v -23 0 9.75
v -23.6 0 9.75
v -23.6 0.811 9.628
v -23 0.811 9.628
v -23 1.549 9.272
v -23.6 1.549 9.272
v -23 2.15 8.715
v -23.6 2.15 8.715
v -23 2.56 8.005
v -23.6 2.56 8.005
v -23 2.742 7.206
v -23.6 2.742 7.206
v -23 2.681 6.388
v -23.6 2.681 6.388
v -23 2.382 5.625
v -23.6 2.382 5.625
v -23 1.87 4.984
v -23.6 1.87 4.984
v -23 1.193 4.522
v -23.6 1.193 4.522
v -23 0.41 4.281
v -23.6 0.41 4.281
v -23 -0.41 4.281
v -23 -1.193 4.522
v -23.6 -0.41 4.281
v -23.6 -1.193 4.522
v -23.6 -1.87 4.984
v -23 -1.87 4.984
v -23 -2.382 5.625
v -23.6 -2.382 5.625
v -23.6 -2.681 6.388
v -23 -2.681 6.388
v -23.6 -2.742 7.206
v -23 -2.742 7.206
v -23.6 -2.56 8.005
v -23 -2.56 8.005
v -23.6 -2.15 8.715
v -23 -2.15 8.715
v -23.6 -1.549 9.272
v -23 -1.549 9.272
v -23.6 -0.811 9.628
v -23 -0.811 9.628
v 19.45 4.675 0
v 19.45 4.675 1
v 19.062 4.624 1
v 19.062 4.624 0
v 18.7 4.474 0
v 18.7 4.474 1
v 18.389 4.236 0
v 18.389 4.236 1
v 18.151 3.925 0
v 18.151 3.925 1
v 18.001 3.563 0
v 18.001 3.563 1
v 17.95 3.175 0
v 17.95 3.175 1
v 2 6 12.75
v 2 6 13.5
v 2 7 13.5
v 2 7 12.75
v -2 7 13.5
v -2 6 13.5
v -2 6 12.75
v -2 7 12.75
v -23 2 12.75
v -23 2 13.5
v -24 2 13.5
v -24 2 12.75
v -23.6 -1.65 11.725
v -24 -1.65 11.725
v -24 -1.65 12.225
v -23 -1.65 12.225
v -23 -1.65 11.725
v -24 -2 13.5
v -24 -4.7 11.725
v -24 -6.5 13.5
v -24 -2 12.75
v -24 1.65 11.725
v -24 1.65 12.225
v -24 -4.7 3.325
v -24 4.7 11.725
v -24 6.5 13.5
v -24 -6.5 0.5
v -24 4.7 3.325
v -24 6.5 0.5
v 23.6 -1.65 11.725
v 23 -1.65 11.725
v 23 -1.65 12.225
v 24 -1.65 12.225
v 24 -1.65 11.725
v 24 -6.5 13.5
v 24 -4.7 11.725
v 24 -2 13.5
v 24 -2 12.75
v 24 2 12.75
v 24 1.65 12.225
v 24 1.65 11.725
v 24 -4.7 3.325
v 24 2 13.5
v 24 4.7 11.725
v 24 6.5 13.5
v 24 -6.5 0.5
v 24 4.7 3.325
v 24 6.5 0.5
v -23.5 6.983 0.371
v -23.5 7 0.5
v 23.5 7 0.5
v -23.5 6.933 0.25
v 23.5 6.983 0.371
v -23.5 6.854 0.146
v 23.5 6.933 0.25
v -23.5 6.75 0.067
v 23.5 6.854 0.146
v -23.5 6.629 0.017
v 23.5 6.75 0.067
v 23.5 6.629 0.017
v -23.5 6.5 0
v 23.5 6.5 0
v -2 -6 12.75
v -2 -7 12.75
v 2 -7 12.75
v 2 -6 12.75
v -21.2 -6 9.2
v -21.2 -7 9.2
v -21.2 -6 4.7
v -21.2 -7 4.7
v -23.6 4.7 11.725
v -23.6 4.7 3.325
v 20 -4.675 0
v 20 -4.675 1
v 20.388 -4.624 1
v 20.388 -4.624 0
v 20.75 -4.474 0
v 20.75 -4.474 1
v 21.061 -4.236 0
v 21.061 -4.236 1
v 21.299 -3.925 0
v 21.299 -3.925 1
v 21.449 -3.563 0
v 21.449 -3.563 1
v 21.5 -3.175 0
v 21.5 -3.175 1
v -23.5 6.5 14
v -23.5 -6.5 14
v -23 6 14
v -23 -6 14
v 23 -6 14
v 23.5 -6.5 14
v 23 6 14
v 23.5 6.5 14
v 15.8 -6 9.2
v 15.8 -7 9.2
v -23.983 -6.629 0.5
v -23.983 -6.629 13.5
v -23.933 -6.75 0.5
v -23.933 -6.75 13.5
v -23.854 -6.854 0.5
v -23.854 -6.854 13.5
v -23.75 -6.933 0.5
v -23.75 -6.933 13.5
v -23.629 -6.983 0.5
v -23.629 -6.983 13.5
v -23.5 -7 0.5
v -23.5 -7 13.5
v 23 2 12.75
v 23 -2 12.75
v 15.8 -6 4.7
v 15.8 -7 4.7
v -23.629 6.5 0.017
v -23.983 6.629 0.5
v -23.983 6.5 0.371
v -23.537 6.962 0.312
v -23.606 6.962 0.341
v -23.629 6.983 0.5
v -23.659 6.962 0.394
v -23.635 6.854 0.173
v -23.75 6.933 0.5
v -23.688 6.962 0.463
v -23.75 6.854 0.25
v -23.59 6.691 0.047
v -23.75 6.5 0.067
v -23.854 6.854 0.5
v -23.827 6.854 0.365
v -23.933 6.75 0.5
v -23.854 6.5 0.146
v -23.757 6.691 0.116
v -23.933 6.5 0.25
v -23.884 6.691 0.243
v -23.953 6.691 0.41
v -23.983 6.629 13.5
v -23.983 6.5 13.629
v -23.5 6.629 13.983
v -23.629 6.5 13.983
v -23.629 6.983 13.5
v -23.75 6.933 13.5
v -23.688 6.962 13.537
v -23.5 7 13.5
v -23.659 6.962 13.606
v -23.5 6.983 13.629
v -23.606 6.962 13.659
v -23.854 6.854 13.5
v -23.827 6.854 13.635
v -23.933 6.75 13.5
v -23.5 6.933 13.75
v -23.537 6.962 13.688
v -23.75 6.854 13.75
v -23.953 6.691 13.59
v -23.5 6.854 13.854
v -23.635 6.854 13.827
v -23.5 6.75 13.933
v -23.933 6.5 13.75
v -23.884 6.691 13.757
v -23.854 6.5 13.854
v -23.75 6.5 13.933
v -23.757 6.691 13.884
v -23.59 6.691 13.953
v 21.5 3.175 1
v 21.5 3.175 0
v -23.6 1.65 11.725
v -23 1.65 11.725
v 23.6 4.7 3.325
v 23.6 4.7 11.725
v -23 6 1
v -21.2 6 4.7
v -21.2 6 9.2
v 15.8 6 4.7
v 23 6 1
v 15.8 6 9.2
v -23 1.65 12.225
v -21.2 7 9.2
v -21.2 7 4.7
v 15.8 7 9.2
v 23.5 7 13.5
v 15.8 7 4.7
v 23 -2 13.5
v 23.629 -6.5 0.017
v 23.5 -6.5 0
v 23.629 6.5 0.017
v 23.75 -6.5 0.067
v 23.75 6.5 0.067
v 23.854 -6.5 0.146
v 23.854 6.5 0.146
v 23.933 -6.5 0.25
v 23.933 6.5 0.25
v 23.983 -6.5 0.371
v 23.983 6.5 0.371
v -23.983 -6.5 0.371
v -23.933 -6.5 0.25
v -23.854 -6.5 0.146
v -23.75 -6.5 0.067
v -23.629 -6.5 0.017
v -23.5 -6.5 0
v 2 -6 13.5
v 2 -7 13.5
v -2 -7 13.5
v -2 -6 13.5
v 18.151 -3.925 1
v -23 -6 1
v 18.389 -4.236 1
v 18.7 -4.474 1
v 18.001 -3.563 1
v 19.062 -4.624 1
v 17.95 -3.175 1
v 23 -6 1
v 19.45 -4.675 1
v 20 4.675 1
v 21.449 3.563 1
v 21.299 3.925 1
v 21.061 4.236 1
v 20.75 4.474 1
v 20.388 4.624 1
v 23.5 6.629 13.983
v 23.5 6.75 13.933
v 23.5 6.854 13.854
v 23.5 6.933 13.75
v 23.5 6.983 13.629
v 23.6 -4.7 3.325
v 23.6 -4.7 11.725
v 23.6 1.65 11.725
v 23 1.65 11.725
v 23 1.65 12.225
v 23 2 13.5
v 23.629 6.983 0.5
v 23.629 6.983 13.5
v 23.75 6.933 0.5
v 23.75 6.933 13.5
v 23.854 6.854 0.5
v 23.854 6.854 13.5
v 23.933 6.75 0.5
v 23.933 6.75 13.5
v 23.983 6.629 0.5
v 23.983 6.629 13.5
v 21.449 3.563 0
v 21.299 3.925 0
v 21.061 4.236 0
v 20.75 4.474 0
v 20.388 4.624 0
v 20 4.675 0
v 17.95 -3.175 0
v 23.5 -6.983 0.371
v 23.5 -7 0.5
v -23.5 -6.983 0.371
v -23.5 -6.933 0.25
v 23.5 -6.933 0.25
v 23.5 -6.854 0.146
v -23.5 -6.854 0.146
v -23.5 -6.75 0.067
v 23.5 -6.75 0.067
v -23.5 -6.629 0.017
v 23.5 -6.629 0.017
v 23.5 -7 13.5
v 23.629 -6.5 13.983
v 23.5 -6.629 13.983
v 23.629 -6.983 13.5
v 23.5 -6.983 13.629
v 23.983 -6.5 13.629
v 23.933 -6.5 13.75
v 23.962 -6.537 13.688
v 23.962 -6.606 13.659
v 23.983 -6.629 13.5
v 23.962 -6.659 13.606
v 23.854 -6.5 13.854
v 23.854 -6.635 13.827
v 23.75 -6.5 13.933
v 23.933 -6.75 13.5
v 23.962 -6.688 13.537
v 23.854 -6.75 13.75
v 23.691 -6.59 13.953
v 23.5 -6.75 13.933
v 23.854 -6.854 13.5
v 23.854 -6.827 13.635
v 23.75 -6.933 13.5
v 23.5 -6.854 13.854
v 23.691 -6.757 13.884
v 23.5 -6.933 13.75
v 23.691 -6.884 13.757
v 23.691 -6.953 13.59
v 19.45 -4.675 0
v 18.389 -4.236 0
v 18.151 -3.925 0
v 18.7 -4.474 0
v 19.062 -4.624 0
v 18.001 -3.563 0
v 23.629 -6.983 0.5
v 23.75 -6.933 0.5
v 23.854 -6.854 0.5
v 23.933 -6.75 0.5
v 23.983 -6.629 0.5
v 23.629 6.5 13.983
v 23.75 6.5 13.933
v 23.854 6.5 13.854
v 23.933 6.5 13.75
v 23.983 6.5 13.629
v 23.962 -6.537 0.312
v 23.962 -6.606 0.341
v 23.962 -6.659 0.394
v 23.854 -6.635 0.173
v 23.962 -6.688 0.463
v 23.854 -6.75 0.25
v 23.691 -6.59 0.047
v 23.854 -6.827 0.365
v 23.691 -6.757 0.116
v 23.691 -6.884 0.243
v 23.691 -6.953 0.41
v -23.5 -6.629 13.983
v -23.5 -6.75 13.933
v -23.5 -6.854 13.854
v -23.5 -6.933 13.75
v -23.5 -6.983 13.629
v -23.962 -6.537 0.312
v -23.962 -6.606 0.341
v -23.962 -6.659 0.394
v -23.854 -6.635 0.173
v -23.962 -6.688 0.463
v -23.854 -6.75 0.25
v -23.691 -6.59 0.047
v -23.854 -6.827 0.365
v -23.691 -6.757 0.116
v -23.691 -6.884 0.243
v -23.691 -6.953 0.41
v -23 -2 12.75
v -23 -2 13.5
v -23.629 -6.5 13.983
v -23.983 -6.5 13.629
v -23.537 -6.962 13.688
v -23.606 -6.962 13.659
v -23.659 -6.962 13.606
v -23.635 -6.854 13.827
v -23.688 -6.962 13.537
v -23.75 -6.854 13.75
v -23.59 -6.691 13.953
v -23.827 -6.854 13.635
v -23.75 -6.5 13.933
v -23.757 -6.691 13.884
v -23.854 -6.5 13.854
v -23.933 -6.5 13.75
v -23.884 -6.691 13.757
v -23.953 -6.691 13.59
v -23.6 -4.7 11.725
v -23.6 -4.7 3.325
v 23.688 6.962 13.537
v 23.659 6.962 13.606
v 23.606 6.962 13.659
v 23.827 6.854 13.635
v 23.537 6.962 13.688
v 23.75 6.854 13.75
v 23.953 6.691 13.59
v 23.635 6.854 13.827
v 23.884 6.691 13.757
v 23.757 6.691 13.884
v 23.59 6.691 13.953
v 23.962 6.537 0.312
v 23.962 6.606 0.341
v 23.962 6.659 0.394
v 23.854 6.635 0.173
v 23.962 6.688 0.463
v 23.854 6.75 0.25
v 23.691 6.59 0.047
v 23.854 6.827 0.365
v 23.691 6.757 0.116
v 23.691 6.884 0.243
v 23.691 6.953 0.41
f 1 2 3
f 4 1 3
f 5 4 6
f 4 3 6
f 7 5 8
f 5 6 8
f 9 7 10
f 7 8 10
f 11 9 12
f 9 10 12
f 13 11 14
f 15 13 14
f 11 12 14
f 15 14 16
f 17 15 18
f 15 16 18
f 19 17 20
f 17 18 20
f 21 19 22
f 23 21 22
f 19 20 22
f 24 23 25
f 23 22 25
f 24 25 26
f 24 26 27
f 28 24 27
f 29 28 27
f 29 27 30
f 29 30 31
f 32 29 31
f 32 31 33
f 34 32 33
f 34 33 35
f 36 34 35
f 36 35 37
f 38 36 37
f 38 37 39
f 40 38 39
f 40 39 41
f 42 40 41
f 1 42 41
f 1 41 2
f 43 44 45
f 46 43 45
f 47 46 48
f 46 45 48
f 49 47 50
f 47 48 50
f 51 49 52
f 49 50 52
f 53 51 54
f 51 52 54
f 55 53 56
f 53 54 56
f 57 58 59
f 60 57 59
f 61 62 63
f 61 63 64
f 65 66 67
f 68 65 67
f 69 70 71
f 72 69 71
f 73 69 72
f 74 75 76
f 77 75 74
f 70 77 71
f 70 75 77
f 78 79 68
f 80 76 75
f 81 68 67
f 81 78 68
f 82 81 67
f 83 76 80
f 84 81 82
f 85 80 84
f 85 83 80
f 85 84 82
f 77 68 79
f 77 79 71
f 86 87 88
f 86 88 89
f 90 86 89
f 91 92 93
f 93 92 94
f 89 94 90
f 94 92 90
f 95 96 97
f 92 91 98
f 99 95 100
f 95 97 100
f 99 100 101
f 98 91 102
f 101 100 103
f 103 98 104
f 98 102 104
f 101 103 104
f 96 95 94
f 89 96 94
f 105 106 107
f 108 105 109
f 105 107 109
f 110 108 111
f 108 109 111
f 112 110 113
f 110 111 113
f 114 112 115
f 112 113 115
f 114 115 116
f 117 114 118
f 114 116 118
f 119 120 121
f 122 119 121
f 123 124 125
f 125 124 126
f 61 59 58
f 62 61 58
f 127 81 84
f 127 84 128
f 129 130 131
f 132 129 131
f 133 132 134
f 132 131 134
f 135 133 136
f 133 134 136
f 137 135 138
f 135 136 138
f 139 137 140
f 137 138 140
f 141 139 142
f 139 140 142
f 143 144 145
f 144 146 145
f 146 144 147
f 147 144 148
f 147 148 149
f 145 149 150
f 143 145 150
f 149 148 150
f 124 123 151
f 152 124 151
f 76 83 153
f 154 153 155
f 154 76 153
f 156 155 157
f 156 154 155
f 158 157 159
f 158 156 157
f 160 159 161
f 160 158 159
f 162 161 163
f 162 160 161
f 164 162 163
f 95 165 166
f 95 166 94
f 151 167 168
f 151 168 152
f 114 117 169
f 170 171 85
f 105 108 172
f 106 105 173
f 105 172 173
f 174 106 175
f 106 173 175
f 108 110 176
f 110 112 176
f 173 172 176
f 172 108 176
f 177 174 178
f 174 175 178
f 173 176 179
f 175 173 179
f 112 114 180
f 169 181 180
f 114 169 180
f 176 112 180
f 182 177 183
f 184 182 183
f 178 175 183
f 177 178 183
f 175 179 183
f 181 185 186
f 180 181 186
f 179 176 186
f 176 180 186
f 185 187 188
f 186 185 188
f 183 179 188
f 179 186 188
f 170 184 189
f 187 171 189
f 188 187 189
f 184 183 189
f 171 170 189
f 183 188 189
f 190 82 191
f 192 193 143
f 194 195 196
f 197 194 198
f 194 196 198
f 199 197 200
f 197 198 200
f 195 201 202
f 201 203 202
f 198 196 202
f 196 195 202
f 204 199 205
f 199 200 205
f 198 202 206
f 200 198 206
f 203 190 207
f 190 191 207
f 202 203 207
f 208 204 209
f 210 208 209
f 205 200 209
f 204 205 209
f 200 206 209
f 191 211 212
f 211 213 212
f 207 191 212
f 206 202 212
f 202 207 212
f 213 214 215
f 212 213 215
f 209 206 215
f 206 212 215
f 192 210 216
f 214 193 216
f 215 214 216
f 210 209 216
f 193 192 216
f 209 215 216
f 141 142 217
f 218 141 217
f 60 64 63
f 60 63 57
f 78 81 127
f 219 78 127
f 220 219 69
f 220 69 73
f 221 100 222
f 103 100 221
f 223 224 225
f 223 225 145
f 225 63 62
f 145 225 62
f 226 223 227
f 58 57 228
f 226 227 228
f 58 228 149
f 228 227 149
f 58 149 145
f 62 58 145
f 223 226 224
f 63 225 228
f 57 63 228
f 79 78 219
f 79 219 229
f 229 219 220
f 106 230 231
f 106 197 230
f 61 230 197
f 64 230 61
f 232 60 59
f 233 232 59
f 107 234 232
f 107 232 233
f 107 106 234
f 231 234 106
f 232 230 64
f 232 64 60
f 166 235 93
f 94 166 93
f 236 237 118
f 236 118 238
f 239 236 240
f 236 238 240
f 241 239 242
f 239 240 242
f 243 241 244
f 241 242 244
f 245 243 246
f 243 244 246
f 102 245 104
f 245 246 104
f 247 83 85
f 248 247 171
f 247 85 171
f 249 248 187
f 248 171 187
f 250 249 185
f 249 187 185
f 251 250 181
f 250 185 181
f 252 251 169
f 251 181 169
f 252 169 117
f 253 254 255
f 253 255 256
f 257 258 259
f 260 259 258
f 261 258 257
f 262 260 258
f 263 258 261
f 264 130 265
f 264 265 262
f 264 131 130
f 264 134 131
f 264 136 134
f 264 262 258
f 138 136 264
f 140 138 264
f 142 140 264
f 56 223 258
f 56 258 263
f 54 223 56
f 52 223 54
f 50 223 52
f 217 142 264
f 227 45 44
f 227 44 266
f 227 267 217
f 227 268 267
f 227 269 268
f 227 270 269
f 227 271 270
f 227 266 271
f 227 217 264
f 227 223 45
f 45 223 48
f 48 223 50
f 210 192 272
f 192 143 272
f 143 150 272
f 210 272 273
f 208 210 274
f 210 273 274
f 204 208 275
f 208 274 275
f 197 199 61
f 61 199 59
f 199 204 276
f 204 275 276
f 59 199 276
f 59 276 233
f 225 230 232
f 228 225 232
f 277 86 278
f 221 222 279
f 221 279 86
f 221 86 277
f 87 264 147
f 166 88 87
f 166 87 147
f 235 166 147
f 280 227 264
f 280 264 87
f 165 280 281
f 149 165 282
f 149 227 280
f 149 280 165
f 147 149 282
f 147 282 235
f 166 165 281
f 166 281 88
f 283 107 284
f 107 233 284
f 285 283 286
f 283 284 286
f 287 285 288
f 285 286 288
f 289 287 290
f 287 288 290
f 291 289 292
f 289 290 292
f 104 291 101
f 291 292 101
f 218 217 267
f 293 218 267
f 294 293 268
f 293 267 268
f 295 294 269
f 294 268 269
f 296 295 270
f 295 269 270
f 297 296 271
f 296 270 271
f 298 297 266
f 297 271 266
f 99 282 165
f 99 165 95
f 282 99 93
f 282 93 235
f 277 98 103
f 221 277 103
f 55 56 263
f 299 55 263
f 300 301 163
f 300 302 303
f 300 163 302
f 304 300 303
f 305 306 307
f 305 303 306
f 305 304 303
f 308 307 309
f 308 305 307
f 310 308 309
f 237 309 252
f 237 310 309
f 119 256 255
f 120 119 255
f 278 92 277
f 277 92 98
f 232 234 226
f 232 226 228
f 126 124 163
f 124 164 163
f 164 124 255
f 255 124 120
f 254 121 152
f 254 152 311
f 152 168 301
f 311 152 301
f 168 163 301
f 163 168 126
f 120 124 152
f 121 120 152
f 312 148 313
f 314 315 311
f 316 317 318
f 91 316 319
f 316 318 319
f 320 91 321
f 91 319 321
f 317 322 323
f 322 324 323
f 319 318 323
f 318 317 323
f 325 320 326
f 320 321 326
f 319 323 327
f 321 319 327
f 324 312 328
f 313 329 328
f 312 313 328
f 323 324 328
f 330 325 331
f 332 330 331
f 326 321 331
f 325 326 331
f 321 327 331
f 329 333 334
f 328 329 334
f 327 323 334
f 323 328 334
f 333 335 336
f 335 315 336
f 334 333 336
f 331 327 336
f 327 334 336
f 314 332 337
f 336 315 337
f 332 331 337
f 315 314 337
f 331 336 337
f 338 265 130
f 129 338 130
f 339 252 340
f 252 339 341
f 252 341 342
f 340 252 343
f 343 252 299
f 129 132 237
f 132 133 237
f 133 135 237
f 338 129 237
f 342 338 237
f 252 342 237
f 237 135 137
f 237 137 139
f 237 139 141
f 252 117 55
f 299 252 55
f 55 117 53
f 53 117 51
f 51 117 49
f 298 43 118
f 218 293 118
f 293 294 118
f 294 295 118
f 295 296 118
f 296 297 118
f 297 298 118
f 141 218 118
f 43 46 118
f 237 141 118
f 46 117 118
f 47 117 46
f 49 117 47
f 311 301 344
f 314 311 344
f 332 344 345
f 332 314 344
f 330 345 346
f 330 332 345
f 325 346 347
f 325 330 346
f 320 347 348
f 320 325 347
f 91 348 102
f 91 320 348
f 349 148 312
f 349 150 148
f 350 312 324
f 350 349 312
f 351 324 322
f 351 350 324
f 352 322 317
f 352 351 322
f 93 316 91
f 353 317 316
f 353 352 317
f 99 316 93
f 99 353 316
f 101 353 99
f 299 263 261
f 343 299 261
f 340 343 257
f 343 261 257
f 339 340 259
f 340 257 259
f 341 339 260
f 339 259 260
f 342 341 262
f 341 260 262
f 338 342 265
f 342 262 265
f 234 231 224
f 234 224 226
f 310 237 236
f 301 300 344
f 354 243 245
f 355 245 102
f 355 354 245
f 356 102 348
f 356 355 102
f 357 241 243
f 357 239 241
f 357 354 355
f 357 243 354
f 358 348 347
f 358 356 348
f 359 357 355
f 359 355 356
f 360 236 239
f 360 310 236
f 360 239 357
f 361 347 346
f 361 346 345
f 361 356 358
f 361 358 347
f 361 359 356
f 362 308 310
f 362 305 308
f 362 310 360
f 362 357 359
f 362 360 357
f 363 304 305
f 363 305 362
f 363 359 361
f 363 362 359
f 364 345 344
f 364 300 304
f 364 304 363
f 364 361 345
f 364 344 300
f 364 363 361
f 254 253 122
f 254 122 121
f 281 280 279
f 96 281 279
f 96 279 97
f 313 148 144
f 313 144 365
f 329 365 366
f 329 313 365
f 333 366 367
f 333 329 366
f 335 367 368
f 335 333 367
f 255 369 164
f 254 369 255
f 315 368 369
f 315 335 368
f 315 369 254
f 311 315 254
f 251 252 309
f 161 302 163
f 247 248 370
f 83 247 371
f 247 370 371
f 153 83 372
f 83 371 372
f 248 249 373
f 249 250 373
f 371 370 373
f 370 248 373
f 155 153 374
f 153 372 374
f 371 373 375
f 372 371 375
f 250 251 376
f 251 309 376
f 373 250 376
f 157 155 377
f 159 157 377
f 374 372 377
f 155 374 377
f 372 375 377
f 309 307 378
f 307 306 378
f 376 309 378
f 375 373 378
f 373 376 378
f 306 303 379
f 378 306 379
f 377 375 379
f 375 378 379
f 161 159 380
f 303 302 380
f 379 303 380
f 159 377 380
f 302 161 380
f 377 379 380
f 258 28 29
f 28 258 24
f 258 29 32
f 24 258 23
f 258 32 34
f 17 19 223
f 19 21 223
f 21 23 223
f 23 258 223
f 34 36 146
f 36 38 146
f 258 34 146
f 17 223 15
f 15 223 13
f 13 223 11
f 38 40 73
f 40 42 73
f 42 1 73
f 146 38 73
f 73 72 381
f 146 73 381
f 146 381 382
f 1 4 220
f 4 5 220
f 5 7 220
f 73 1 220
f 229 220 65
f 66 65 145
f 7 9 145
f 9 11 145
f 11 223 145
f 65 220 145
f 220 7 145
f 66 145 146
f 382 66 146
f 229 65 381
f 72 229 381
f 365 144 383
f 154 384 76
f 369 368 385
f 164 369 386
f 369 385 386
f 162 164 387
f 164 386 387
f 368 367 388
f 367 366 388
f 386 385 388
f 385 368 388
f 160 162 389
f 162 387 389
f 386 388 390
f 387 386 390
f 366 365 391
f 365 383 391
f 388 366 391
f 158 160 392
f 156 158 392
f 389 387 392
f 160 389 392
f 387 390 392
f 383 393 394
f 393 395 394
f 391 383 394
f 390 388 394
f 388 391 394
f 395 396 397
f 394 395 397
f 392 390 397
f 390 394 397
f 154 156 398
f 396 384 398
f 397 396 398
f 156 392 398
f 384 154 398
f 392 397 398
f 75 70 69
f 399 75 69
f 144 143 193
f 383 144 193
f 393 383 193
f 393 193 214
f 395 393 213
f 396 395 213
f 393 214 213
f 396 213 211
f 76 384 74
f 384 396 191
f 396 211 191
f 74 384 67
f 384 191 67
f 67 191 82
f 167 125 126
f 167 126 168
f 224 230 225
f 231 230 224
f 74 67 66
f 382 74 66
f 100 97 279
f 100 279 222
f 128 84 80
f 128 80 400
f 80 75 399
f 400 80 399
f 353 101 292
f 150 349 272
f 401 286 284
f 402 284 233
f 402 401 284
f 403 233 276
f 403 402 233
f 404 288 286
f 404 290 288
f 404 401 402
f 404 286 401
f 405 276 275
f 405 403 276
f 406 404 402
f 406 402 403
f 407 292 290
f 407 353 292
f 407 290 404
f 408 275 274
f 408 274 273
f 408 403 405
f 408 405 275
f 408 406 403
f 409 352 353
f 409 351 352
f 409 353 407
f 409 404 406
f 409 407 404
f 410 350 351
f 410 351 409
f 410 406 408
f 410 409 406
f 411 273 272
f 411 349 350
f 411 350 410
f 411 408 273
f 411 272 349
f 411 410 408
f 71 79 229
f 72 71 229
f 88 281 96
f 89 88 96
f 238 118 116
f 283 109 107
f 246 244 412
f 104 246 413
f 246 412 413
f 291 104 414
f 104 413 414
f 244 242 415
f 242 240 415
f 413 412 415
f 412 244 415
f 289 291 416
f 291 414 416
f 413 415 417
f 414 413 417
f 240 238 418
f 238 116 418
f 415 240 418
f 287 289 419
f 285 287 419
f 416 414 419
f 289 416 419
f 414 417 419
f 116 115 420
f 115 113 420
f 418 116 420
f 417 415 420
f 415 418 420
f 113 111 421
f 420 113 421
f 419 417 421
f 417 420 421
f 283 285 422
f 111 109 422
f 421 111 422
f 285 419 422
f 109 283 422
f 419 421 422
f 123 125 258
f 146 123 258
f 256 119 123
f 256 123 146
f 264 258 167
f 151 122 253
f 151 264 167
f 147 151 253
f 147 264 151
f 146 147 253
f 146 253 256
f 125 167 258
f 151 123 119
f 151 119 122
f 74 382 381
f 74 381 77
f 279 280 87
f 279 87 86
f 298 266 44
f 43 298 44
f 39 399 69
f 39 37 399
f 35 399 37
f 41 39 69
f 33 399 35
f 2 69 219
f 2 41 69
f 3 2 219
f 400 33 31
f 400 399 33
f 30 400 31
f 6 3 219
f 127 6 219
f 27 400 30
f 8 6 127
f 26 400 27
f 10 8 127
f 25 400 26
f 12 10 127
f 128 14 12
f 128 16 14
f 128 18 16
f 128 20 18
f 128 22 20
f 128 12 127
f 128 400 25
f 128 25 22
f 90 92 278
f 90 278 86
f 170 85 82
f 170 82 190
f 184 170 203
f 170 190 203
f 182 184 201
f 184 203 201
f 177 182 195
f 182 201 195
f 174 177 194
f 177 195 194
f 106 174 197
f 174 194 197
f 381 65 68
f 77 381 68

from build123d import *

# Parameters (mm, degrees)
SKETCH3_W               = 48
SKETCH3_H               = 14
BOSS_EXTRUDE2_DEPTH     = 14
SKETCH4_W               = 46
SKETCH4_H               = 12
CUT_EXTRUDE1_DEPTH      = 13
FILLET1_R               = 0.5
CUT_EXTRUDE2_DEPTH      = 32.112698372
CUT_EXTRUDE2_DEPTH_BACK = 32.112698372
SKETCH6_W               = 37
SKETCH6_H               = 4.5
SKETCH14_W              = 4
SKETCH14_H              = 1
CUT_EXTRUDE8_DEPTH      = 1.25
SKETCH15_W              = 1
SKETCH15_H              = 4
CUT_EXTRUDE9_DEPTH      = 1.25
CUT_EXTRUDE10_DEPTH     = 29.178005607
SKETCH20_W              = 1.2
SKETCH20_H              = 11
BOSS_EXTRUDE3_DEPTH     = 3
FILLET2_R               = 0.5
FILLET2_OF_MIRROR4_R    = 0.5
SKETCH24_R              = 2.75
CUT_EXTRUDE14_DEPTH     = 1
SKETCH25_W              = 0.6
SKETCH25_H              = 12
BOSS_EXTRUDE4_DEPTH     = 2.3
SKETCH28_W              = 8.4
SKETCH28_H              = 9.4
CUT_EXTRUDE15_DEPTH     = 0.4
SKETCH30_W              = 0.7
SKETCH30_H              = 12
BOSS_EXTRUDE6_DEPTH     = 11.75
CUT_EXTRUDE22_REACH     = 52.488
SKETCH38_W              = 0.5
SKETCH38_H              = 3.3
SKETCH39_W              = 0.6
SKETCH39_H              = 1.25
BOSS_EXTRUDE7_DEPTH     = 8.7
FILLET5_R               = 5
MIRROR5_START           = 3.325
MIRROR5_OUTLINE_W       = 0.4
MIRROR5_OUTLINE_H       = 9.4
MIRROR5_DEPTH           = 8.4
MIRROR5_START_2         = 11.725
MIRROR5_2_OUTLINE_W     = 1
MIRROR5_2_OUTLINE_H     = 3.3
MIRROR5_2_OUTLINE_W_2   = 0.7
MIRROR5_2_DEPTH         = 0.5
SKETCH36_W              = 0.7
SKETCH36_H              = 12
CUT_EXTRUDE23_DEPTH     = 11.75
SKETCH40_W              = 1.8
SKETCH40_H              = 12
CUT_EXTRUDE24_DEPTH     = 11
BOSS_EXTRUDE8_START     = 4
BOSS_EXTRUDE8_DEPTH     = 4
BOSS_EXTRUDE9_DEPTH     = 4


# Read off the part's stored shape, not the designer's step: Mirror5
with BuildPart() as part:
    # Sketch3 → Boss-Extrude2 (new body)
    with BuildSketch(Plane.XY):
        Rectangle(SKETCH3_W, SKETCH3_H)
    extrude(amount=BOSS_EXTRUDE2_DEPTH)

    # Sketch4 → Cut-Extrude1 (cut)
    with BuildSketch(Plane.XY.offset(14)):
        Rectangle(SKETCH4_W, SKETCH4_H)
    extrude(amount=-CUT_EXTRUDE1_DEPTH, mode=Mode.SUBTRACT)

    # Fillet1
    fillet1_edges = [part.edges().sort_by_distance(p)[0] for p in [
        (-24, 0, 14),
        (0, -7, 14),
        (24, 0, 14),
        (0, -7, 0),
        (-24, 0, 0),
        (0, 7, 0),
        (24, 0, 0),
        (24, -7, 7),
        (-24, -7, 7),
        (-24, 7, 7),
        (24, 7, 7),
        (0, 7, 14),
    ]]
    fillet(fillet1_edges, radius=FILLET1_R)

    # Sketch6 → Cut-Extrude2 (cut, two sides: drawn at the far end of the back side and taken through both)
    with BuildSketch(Plane.XZ.offset(7).offset(-CUT_EXTRUDE2_DEPTH_BACK)):
        with Locations((-2.7, 6.95)):
            Rectangle(SKETCH6_W, SKETCH6_H)
    extrude(amount=CUT_EXTRUDE2_DEPTH + CUT_EXTRUDE2_DEPTH_BACK, mode=Mode.SUBTRACT)

    # Sketch14 → Cut-Extrude8 (cut)
    with BuildSketch(Plane.XY.offset(14)):
        with Locations((0, 6.5)):
            Rectangle(SKETCH14_W, SKETCH14_H)
    cut_extrude8 = extrude(amount=-CUT_EXTRUDE8_DEPTH, mode=Mode.SUBTRACT)

    # Mirror1: Cut-Extrude8 across plane
    add(cut_extrude8.mirror(Plane(origin=(0, 0, 0), x_dir=(0, 0, 1), z_dir=(0, -1, 0))), mode=Mode.SUBTRACT)

    # Sketch15 → Cut-Extrude9 (cut)
    with BuildSketch(Plane.XY.offset(14)):
        with Locations((23.5, 0)):
            Rectangle(SKETCH15_W, SKETCH15_H)
    cut_extrude9 = extrude(amount=-CUT_EXTRUDE9_DEPTH, mode=Mode.SUBTRACT)

    # Mirror3: Cut-Extrude9 across plane
    add(cut_extrude9.mirror(Plane.ZY), mode=Mode.SUBTRACT)

    # Sketch17 → Cut-Extrude10 (cut, through all)
    with BuildSketch(Plane.XY.offset(1)):
        with BuildLine():
            Line((20, 4.675), (19.45, 4.675))
            ThreePointArc((19.45, 4.675), (18.389339828, 4.235660172), (17.95, 3.175))
            Line((17.95, 3.175), (17.95, -3.175))
            ThreePointArc((17.95, -3.175), (18.389339828, -4.235660172), (19.45, -4.675))
            Line((19.45, -4.675), (20, -4.675))
            ThreePointArc((20, -4.675), (21.060660172, -4.235660172), (21.5, -3.175))
            Line((21.5, -3.175), (21.5, 3.175))
            ThreePointArc((21.5, 3.175), (21.060660172, 4.235660172), (20, 4.675))
        make_face()
    extrude(amount=-CUT_EXTRUDE10_DEPTH, mode=Mode.SUBTRACT)

    # Sketch20 → Boss-Extrude3 (add)
    with BuildSketch(Plane(origin=(0, -6, 0), x_dir=(1, 0, 0), z_dir=(0, 1, 0))):
        with Locations((-21.8, -6.5)):
            Rectangle(SKETCH20_W, SKETCH20_H)
    boss_extrude3 = extrude(amount=BOSS_EXTRUDE3_DEPTH)

    # Fillet2
    fillet2_edges = [part.edges().sort_by_distance(p)[0] for p in [
        (-21.2, -3, 6.5),
        (-22.4, -3, 6.5),
    ]]
    fillet(fillet2_edges, radius=FILLET2_R)

    # Mirror4: Boss-Extrude3 across plane
    add(boss_extrude3.mirror(Plane(origin=(0, 0, 0), x_dir=(0, 0, 1), z_dir=(0, -1, 0))))

    # Fillet2 of Mirror4
    fillet2_of_mirror4_edges = [part.edges().sort_by_distance(p)[0] for p in [
        (-21.2, 3, 6.5),
        (-22.4, 3, 6.5),
    ]]
    fillet(fillet2_of_mirror4_edges, radius=FILLET2_OF_MIRROR4_R)

    # Sketch24 → Cut-Extrude14 (cut)
    with BuildSketch(Plane.ZY.offset(24)):
        with Locations((7, 0)):
            Circle(SKETCH24_R)
    extrude(amount=-CUT_EXTRUDE14_DEPTH, mode=Mode.SUBTRACT)

    # Sketch25 → Boss-Extrude4 (add)
    with BuildSketch(Plane.XY.offset(1)):
        with Locations((-22.7, 0)):
            Rectangle(SKETCH25_W, SKETCH25_H)
    extrude(amount=BOSS_EXTRUDE4_DEPTH)

    # Sketch28 → Cut-Extrude15 (cut)
    with BuildSketch(Plane(origin=(24, 0, 0), x_dir=(0, 0, -1), z_dir=(1, 0, 0))):
        with Locations((-7.525, 0)):
            Rectangle(SKETCH28_W, SKETCH28_H)
    extrude(amount=-CUT_EXTRUDE15_DEPTH, mode=Mode.SUBTRACT)

    # Sketch30 → Boss-Extrude6 (add)
    with BuildSketch(Plane.XY.offset(1)):
        with Locations((22.65, 0)):
            Rectangle(SKETCH30_W, SKETCH30_H)
    extrude(amount=BOSS_EXTRUDE6_DEPTH)

    # Cut-Extrude22: up to this face of the body (flat: up to its plane)
    cut_extrude22_end = Plane(part.part.faces().sort_by_distance((23, 4, 13.375))[0])
    # Sketch38 → Cut-Extrude22 (cut, up to the picked face)
    with BuildSketch(Plane(origin=(24, 0, 0), x_dir=(0, 0, -1), z_dir=(1, 0, 0)), mode=Mode.PRIVATE) as cut_extrude22_sk1:
        with Locations((-11.975, 0)):
            Rectangle(SKETCH38_W, SKETCH38_H)
    cut_extrude22_tool1 = split(extrude(cut_extrude22_sk1.sketch, amount=-CUT_EXTRUDE22_REACH, mode=Mode.PRIVATE), bisect_by=cut_extrude22_end, keep=Keep.BOTH, mode=Mode.PRIVATE)
    add(cut_extrude22_tool1.solids().sort_by(Axis((24, 0, 11.975), (-1, 0, 0)))[0], mode=Mode.SUBTRACT)

    # Sketch39 → Boss-Extrude7 (add)
    with BuildSketch(Plane.XY.offset(3.3)):
        with Locations((-22.7, 5.375)):
            Rectangle(SKETCH39_W, SKETCH39_H)
        with Locations((-22.7, -5.375)):
            Rectangle(SKETCH39_W, SKETCH39_H)
    extrude(amount=BOSS_EXTRUDE7_DEPTH)

    # Fillet5
    # the kernel refuses this fillet: 5 mm, written as the material it takes off along each edge
    with BuildSketch(Plane(origin=(-23, 4.75, 12), x_dir=(0, 1, 0), z_dir=(1, 0, 0))) as fillet5_piece_1:
        with BuildLine():
            CenterArc((5, -3.307189139), FILLET5_R, 138.590377891, 41.409622109)
            Line((0, -3.307189139), (0, 0))
            Line((0, 0), (1.25, 0))
        make_face()
    extrude(amount=0.6, mode=Mode.SUBTRACT)
    with BuildSketch(Plane(origin=(-23, -4.75, 12), x_dir=(0, 0, -1), z_dir=(1, 0, 0))) as fillet5_piece_2:
        with BuildLine():
            CenterArc((3.307189139, -5), FILLET5_R, 90, 41.409622109)
            Line((0, -1.25), (0, 0))
            Line((0, 0), (3.307189139, 0))
        make_face()
    extrude(amount=0.6, mode=Mode.SUBTRACT)

    # Mirror5 outline → Mirror5 (cut)
    with BuildSketch(Plane.XY.offset(MIRROR5_START)):
        with Locations((-23.8, 0)):
            Rectangle(MIRROR5_OUTLINE_W, MIRROR5_OUTLINE_H)
    extrude(amount=MIRROR5_DEPTH, mode=Mode.SUBTRACT)

    # Mirror5 2 outline → Mirror5 2 (cut)
    with BuildSketch(Plane.XY.offset(MIRROR5_START_2)):
        with Locations((-23.5, 0)):
            Rectangle(MIRROR5_2_OUTLINE_W, MIRROR5_2_OUTLINE_H)
        with Locations((22.65, 0)):
            Rectangle(MIRROR5_2_OUTLINE_W_2, MIRROR5_2_OUTLINE_H)
    extrude(amount=MIRROR5_2_DEPTH, mode=Mode.SUBTRACT)

    # Sketch36 → Cut-Extrude23 (cut)
    with BuildSketch(Plane.XY.offset(12.75)):
        with Locations((22.65, 0)):
            Rectangle(SKETCH36_W, SKETCH36_H)
    extrude(amount=-CUT_EXTRUDE23_DEPTH, mode=Mode.SUBTRACT)

    # Sketch40 → Cut-Extrude24 (cut)
    with BuildSketch(Plane.XY.offset(12)):
        with Locations((-22.1, 0)):
            Rectangle(SKETCH40_W, SKETCH40_H)
    extrude(amount=-CUT_EXTRUDE24_DEPTH, mode=Mode.SUBTRACT)

    # Sketch41 → Boss-Extrude8 (add)
    with BuildSketch(Plane(origin=(0, -2, 0), x_dir=(1, 0, 0), z_dir=(0, 1, 0)).offset(BOSS_EXTRUDE8_START)):
        with BuildLine():
            Line((24, -13.5), (23, -13.5))
            Line((23, -13.5), (23, -14))
            Line((23, -14), (23.5, -14))
            ThreePointArc((23.5, -14), (23.853553391, -13.853553391), (24, -13.5))
        make_face()
    boss_extrude8 = extrude(amount=-BOSS_EXTRUDE8_DEPTH)

    # Mirror6: Boss-Extrude8 across plane
    add(boss_extrude8.mirror(Plane.ZY))

    # Sketch42 → Boss-Extrude9 (add)
    with BuildSketch(Plane.ZY.offset(-2)):
        with BuildLine():
            Line((14, -6), (14, -6.5))
            ThreePointArc((14, -6.5), (13.853553391, -6.853553391), (13.5, -7))
            Line((13.5, -7), (13.5, -6))
            Line((13.5, -6), (14, -6))
        make_face()
    boss_extrude9 = extrude(amount=BOSS_EXTRUDE9_DEPTH)

    # Mirror7: Boss-Extrude9 across plane
    add(boss_extrude9.mirror(Plane(origin=(0, 0, 0), x_dir=(0, 0, 1), z_dir=(0, -1, 0))))


solid = part.part
